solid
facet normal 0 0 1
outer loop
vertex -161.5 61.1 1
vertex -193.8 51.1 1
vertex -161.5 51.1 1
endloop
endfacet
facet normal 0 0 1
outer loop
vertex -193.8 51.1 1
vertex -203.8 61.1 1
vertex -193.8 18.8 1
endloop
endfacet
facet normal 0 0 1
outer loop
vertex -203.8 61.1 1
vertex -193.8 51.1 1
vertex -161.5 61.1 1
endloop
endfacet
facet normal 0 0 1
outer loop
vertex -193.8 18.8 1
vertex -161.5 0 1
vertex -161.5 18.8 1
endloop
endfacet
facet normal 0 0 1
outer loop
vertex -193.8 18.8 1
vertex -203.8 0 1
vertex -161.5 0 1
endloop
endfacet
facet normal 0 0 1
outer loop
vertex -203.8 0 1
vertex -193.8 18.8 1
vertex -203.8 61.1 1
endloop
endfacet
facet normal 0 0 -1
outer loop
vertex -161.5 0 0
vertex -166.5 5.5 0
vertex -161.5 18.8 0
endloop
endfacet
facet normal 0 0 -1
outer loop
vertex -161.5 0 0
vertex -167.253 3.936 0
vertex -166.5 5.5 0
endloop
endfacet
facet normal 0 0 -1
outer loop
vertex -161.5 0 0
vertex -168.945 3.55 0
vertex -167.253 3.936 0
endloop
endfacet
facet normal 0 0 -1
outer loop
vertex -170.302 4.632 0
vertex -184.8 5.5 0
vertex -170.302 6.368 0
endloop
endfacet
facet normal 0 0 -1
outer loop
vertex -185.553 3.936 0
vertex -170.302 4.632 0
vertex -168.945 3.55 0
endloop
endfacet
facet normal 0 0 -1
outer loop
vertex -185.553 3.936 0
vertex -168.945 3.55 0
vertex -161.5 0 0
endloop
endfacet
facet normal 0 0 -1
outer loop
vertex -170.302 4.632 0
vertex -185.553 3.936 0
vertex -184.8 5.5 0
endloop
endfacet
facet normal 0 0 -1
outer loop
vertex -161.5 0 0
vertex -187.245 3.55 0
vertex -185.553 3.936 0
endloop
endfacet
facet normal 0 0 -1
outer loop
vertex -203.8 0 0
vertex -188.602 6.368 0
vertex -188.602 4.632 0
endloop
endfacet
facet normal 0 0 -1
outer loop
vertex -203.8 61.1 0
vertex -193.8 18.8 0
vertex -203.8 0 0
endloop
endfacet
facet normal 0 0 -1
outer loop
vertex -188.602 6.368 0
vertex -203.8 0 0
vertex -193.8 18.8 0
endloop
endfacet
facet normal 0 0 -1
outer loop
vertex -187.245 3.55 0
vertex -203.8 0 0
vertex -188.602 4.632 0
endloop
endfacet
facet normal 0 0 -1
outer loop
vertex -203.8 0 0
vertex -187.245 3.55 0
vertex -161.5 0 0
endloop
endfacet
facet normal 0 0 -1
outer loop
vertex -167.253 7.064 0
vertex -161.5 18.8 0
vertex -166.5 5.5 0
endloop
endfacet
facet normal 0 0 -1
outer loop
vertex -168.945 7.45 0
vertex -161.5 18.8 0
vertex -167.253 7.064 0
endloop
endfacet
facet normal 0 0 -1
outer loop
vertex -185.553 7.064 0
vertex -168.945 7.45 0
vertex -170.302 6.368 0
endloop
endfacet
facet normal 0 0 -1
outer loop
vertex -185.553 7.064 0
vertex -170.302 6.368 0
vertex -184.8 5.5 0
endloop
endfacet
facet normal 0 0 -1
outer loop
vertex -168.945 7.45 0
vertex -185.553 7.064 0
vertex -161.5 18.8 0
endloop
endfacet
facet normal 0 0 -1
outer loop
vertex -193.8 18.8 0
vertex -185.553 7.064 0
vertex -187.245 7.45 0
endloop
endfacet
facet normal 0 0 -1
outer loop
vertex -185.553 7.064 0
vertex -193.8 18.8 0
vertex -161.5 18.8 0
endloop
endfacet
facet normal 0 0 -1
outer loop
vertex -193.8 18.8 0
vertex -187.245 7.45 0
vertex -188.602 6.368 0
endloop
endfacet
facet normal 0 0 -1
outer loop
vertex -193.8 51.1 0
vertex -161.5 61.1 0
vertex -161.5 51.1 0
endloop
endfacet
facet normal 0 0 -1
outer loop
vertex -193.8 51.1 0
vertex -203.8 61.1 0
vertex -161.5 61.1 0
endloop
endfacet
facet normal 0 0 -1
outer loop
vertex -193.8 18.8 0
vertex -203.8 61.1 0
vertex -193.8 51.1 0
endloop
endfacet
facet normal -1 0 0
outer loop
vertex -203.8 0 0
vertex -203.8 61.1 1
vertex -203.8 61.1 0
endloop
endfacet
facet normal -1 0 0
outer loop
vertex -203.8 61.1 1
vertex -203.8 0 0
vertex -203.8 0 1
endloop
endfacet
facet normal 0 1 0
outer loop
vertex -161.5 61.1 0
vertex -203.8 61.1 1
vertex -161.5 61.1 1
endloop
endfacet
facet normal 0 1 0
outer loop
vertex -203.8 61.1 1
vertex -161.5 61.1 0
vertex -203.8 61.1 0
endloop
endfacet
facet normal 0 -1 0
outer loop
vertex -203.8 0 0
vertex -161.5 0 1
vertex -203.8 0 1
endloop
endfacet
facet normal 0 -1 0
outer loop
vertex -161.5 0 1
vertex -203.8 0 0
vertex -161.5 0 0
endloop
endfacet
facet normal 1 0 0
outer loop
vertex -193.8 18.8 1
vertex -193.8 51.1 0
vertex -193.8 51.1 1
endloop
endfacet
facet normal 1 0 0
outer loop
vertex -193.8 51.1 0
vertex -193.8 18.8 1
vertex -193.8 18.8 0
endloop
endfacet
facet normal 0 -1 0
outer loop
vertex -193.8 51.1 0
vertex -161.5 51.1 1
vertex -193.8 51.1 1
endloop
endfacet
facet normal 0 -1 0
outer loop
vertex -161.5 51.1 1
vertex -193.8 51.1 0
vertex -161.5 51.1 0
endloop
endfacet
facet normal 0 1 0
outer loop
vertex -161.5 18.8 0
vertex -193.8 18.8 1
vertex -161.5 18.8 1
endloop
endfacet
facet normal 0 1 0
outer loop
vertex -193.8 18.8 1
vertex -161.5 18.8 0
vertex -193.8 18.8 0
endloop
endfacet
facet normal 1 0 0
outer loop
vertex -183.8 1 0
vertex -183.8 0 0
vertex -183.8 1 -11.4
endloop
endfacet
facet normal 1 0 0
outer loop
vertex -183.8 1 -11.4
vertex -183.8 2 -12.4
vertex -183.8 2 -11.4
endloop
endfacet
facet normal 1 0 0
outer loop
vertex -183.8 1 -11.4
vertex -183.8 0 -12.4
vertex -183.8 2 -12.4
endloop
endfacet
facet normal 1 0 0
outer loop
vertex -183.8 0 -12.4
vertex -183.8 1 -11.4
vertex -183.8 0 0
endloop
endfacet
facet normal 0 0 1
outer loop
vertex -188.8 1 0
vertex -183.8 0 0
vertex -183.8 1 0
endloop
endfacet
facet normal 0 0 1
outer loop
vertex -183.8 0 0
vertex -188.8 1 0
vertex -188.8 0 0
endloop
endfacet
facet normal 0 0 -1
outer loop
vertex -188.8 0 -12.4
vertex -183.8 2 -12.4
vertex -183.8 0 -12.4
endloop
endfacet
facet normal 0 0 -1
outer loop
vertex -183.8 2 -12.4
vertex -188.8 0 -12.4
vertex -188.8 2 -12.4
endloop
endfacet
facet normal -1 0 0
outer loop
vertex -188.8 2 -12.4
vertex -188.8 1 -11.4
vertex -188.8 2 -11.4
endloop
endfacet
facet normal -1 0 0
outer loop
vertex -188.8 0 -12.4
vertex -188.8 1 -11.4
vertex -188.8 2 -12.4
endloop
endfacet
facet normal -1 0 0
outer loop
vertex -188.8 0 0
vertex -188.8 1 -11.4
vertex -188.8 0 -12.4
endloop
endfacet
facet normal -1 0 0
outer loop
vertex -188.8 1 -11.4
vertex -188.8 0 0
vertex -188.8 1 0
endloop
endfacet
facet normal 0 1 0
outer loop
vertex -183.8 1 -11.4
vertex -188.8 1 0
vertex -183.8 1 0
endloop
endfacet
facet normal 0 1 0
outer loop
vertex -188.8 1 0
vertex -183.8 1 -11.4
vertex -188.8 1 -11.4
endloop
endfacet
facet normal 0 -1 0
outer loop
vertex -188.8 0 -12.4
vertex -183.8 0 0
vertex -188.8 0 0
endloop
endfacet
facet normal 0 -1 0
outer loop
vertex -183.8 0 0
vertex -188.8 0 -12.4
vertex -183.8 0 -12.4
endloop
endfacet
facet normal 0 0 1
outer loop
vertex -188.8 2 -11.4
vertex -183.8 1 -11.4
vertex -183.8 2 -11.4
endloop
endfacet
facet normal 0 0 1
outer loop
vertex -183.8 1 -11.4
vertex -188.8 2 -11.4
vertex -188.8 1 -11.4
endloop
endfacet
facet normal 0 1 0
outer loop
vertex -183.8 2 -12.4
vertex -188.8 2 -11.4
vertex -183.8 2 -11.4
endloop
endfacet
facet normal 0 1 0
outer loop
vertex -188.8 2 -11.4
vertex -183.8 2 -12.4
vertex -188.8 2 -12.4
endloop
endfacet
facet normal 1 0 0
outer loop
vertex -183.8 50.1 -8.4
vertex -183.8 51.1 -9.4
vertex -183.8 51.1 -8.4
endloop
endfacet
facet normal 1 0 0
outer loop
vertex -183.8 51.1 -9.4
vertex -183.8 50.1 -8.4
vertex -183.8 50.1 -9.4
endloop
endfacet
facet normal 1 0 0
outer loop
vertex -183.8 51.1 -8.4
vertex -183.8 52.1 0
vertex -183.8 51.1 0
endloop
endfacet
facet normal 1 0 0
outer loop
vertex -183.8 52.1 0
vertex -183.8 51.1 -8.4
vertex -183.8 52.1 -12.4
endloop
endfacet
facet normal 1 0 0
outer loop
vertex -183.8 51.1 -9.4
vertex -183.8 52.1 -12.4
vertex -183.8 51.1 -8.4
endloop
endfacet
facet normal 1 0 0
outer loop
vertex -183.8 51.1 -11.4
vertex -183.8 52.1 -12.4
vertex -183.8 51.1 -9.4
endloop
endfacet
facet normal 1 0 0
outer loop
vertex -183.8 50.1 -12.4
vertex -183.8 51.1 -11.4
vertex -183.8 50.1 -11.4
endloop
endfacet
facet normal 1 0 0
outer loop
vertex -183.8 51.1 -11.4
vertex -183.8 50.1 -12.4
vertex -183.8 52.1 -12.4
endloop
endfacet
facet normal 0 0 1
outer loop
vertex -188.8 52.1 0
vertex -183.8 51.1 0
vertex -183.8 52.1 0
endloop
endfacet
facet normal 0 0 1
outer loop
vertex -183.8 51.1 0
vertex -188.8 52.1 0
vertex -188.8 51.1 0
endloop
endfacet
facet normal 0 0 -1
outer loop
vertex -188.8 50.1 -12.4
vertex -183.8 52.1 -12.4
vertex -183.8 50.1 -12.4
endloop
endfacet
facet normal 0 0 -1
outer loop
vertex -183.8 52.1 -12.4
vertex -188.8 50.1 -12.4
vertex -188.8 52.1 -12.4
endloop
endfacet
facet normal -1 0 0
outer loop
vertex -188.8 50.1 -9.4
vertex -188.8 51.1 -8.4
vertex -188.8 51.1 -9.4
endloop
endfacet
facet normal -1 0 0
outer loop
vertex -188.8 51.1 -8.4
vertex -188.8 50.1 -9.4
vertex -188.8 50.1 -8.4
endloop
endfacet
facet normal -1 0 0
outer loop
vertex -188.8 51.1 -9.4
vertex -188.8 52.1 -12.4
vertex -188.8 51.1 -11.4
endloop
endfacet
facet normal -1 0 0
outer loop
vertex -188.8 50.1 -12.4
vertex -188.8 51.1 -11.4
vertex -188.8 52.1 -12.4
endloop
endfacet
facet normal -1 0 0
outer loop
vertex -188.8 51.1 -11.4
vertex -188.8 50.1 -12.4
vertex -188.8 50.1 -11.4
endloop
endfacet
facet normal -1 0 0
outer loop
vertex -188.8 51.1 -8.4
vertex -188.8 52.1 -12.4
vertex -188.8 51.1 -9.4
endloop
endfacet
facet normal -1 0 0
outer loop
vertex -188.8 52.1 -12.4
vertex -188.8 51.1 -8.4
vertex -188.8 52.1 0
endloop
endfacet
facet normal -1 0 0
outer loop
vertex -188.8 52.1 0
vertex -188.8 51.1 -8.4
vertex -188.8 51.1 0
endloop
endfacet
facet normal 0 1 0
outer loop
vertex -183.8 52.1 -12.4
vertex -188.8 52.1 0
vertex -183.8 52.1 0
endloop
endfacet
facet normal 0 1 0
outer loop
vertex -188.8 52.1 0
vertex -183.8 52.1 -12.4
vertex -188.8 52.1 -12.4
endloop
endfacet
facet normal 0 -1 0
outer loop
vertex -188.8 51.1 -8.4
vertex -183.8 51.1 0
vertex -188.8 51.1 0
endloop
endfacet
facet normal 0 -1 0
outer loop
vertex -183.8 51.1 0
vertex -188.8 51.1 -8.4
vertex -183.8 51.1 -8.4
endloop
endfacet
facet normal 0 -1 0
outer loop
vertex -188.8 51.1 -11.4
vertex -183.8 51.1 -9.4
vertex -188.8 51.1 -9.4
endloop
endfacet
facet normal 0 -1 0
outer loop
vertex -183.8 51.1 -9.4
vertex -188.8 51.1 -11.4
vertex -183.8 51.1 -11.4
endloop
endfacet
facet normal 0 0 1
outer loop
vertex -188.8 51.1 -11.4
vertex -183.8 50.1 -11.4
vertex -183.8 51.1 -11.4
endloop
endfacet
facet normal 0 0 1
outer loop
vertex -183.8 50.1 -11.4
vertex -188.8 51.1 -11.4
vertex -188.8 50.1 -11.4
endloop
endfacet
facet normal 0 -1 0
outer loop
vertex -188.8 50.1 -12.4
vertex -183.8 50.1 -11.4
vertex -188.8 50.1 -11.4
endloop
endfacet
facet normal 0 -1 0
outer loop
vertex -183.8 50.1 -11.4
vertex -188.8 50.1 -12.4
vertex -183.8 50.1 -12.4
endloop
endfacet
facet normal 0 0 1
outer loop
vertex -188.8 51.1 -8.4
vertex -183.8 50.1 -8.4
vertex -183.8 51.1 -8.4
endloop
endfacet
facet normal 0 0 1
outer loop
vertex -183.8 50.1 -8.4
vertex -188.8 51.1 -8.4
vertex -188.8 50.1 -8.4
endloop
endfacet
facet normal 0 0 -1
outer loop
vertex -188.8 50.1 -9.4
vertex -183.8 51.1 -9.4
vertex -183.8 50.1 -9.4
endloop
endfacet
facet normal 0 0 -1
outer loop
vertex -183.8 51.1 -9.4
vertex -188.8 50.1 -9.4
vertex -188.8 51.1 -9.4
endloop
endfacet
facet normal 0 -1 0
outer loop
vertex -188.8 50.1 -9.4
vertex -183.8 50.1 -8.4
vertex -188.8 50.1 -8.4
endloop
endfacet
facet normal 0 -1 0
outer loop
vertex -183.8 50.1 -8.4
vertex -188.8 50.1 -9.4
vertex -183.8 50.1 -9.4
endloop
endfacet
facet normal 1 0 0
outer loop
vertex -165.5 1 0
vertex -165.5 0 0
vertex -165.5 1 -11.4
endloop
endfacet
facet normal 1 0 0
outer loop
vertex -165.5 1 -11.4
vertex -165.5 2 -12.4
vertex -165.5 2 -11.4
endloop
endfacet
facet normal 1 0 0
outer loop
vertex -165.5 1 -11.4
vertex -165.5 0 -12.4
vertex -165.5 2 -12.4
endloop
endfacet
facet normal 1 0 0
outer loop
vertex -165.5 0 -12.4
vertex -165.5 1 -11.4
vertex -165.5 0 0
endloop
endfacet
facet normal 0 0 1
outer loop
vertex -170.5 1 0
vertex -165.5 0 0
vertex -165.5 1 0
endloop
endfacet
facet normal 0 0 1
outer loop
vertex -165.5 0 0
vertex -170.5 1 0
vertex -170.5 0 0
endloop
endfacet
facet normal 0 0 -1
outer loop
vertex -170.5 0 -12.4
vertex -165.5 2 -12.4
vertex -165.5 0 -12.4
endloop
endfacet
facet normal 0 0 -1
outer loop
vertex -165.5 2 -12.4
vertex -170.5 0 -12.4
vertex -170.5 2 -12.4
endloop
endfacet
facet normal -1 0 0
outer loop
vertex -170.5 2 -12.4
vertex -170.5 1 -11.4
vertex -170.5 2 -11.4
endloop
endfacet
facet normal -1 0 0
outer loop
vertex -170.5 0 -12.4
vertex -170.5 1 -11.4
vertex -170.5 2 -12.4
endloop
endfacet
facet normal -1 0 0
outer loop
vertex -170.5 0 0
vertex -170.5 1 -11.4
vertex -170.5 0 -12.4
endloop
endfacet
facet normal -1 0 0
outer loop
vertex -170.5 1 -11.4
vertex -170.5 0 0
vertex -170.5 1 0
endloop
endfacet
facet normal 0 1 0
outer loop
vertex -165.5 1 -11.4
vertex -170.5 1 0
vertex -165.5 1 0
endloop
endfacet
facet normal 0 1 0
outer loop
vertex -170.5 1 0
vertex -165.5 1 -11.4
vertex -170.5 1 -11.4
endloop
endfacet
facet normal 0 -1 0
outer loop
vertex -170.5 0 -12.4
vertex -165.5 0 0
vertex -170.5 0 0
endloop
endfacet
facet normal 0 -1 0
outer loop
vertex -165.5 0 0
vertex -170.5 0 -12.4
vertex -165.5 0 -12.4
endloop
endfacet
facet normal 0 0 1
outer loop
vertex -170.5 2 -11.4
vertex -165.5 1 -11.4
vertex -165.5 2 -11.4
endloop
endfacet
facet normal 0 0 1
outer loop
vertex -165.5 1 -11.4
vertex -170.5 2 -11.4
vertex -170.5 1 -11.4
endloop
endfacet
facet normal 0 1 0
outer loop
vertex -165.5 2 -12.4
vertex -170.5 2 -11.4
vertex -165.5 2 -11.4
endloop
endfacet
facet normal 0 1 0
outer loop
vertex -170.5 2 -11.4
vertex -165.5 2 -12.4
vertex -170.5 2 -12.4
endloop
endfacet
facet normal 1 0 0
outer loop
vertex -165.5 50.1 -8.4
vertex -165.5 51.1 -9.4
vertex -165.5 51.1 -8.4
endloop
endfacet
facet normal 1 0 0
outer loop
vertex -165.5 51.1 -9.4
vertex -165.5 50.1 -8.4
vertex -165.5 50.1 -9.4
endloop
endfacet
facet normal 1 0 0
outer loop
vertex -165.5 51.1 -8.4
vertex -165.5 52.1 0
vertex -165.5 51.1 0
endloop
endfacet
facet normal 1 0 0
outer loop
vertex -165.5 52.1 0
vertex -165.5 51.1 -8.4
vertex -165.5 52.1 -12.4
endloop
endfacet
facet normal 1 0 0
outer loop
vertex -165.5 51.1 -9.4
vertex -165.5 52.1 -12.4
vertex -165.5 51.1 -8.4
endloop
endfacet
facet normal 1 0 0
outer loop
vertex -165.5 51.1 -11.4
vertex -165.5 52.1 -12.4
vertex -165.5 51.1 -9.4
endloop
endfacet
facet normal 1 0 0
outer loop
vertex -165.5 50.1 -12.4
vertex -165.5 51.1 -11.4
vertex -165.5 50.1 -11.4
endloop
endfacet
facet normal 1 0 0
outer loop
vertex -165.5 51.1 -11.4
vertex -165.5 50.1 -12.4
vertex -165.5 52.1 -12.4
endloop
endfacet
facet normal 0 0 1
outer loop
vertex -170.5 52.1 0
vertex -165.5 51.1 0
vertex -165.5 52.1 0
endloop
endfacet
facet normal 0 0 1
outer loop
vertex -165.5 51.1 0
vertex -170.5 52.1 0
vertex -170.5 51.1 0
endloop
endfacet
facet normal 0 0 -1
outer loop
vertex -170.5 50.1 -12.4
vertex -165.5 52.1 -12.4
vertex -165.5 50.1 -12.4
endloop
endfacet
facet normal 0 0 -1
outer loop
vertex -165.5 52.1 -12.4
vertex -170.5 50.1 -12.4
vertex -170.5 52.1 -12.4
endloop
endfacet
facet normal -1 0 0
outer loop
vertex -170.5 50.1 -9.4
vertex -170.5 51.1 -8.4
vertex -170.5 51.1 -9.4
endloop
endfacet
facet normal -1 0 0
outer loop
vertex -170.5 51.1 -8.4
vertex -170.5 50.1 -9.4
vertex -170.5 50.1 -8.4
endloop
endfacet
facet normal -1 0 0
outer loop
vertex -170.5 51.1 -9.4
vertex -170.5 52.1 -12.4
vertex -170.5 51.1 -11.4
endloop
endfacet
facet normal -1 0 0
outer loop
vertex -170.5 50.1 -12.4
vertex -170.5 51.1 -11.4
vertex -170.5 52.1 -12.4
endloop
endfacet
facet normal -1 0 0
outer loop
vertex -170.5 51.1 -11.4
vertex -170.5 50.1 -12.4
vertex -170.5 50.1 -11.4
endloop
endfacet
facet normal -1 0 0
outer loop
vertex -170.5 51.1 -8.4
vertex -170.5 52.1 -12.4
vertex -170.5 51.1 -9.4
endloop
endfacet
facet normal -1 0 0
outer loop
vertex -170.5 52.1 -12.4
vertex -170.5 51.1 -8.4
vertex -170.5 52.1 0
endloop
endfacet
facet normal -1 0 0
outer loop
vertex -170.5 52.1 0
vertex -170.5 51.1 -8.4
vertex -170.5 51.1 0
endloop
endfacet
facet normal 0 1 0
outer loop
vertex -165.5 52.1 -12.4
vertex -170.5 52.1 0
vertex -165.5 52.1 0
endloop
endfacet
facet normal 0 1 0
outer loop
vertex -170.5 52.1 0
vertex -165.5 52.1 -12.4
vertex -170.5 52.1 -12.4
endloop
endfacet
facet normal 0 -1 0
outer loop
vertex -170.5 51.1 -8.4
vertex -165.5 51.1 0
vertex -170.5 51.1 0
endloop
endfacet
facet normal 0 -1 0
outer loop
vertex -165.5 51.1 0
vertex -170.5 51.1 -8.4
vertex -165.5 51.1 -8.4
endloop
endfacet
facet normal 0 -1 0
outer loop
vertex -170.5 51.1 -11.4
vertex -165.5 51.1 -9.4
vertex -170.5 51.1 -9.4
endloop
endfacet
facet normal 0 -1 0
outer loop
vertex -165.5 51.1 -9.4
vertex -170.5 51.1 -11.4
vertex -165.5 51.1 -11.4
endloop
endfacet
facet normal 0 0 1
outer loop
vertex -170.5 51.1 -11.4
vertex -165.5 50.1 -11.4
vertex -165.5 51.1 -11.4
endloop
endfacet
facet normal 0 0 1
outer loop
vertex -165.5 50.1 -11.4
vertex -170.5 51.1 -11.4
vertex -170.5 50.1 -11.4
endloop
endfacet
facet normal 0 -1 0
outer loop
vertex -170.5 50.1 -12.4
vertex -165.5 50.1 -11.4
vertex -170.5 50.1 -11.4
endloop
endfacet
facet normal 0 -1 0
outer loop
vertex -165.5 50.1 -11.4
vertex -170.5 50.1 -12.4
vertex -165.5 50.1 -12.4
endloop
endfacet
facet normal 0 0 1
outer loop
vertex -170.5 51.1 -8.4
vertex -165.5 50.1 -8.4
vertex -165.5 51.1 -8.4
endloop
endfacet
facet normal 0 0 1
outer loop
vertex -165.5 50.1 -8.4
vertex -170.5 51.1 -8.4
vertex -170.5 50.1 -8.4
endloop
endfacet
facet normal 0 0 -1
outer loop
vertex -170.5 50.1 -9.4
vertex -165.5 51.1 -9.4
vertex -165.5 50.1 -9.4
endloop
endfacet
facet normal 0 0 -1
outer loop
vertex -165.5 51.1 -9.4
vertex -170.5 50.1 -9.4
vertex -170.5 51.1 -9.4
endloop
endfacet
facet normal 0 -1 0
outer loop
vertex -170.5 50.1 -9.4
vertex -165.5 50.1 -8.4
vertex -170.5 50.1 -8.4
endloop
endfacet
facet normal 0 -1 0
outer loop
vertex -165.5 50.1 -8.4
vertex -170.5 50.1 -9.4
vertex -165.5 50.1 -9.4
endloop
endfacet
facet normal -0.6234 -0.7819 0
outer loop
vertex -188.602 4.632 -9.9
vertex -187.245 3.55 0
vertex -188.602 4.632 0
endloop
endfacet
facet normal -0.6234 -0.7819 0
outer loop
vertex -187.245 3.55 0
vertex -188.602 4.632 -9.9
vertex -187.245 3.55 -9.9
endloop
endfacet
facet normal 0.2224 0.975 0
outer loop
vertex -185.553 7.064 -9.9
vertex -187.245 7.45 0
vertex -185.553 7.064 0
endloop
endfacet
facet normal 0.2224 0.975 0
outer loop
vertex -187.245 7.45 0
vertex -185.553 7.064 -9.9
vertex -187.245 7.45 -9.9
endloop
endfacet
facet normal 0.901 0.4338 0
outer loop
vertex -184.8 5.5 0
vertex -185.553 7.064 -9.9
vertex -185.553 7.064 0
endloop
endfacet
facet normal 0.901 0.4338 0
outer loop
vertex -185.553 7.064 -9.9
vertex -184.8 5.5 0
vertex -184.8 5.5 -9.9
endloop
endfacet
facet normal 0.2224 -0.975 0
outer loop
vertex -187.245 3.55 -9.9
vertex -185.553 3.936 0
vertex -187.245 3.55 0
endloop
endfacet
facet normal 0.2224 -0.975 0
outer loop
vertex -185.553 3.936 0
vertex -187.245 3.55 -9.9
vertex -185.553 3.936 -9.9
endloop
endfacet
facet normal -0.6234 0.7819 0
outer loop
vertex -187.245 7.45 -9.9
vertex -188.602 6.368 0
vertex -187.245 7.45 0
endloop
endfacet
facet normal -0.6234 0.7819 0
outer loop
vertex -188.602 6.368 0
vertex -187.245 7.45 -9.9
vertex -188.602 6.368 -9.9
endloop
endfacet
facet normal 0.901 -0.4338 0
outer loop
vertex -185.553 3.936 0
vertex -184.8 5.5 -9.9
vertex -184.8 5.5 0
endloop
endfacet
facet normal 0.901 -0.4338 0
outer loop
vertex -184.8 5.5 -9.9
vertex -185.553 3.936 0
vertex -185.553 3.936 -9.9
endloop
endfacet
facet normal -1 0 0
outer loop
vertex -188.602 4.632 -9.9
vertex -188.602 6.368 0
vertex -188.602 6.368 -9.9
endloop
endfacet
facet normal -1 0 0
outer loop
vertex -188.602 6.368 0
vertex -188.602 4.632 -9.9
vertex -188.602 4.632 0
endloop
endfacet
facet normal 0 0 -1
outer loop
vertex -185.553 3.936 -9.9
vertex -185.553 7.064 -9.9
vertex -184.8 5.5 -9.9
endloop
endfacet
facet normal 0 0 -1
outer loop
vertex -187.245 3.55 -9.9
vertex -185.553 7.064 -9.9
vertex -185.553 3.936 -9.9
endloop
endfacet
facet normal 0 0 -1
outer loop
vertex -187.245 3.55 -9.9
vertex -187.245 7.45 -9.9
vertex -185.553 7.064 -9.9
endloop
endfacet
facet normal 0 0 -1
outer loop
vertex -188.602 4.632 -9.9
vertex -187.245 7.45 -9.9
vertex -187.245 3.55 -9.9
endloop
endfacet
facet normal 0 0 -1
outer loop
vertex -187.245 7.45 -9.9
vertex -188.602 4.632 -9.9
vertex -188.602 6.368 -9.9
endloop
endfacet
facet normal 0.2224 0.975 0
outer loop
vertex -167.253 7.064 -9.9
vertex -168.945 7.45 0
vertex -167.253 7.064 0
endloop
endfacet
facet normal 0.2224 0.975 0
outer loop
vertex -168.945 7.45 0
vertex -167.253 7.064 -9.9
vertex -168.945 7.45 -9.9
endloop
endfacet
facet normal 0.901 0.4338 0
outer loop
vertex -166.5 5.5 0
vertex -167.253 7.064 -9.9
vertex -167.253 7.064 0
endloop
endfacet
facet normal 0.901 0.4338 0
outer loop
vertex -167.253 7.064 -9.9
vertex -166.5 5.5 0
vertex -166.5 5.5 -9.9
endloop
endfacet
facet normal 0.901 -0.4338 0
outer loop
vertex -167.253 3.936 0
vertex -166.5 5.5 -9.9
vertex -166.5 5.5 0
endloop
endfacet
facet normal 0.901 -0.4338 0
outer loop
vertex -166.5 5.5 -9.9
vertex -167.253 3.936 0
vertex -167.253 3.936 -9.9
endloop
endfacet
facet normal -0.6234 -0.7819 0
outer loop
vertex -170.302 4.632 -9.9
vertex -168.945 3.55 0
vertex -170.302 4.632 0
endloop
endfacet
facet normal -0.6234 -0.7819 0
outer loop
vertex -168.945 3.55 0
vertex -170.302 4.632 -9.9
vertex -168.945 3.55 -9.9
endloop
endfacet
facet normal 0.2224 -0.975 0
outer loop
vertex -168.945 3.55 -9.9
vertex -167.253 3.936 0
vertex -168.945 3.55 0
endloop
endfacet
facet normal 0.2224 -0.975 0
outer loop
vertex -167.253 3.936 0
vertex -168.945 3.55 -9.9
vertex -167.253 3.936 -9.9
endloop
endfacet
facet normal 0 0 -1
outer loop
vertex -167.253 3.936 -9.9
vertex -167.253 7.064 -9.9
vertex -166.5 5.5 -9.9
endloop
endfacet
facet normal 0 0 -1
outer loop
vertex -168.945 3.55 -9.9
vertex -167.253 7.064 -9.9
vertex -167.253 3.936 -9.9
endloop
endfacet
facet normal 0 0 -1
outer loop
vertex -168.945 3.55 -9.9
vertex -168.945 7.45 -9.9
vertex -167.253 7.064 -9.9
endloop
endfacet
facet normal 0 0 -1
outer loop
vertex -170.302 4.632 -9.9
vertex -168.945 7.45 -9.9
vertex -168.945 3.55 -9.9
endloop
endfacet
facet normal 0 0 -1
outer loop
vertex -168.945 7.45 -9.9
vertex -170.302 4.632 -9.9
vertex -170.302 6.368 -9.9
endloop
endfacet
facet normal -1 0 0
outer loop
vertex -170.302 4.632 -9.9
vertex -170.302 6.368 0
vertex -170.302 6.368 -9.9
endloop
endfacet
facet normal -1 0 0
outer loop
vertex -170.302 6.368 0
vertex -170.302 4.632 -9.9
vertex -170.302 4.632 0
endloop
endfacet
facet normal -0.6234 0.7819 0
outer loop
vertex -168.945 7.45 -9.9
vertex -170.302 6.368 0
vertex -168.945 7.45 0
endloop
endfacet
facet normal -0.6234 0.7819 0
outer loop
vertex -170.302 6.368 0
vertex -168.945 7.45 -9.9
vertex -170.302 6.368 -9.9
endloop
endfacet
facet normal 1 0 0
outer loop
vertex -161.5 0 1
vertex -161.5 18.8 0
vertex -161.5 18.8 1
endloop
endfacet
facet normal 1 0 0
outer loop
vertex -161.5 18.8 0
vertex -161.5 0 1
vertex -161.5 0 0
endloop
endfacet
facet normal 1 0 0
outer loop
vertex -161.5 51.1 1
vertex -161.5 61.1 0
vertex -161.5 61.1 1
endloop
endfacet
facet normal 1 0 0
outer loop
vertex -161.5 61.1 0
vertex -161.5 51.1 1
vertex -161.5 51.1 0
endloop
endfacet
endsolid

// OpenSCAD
// SPDX-License-Identifier: AGPL-3.0-or-later
// SPDX-FileCopyrightText: Copyright 2022-2025 Zeus WPI

//#cube([31.82, 31.82, 7.13]);
base_width = 32.3;
base_height = 50.22;
hole_radius = 1.5;
d_edge_to_center_of_holes = 1.15 + hole_radius;
pin_height = 6;


total_height=15.26;
total_length=74;
display_start_length_from_top = 12;
width_of_ports=13;


// cover
screen_side = base_width;
height_base_and_screen = 15.6;
cover_thickness = 1;
chip_part_height = 17.8;
side_edge_width = 10; 
top_edge_width = 10;
bottom_edge_width = chip_part_height + 1;
clip_width = 5;
top_of_screen_to_top_of_chip_board = 10.9;
chip_board_thickness = 1.5;

lip = 1;
clip_length = top_of_screen_to_top_of_chip_board-cover_thickness+chip_board_thickness+lip;
module bottom_clip() {    
    translate([-6*screen_side,0,-clip_length]) {
        cube([clip_width,1,clip_length]);
        translate([0,1,0]) {cube([clip_width,1,1]);};
    };
}

module top_clip() {
    
    translate([-6*screen_side,screen_side+chip_part_height+1,-clip_length]) {
        cube([clip_width,1,clip_length]);
        translate([0,-1,0]) {cube([5,1,1]);};
        translate([0,-1,1+chip_board_thickness + 0.5]) {cube([5,1,1]);};
    };
}

module stick() {
    cylinder_height = top_of_screen_to_top_of_chip_board-cover_thickness;
    translate([-(6*screen_side) + 7,5.5,-cylinder_height]) {cylinder(cylinder_height, 2, 2);};
    translate([-(6*screen_side) + screen_side - 7,5.5,-cylinder_height]) {cylinder(cylinder_height, 2, 2);};
}

module cover() {
    difference() {
        translate([-(6*screen_side + side_edge_width),0,0]) {cube([6*screen_side + side_edge_width, screen_side + top_edge_width + bottom_edge_width, cover_thickness]);};
        translate([-(6*screen_side), bottom_edge_width, -1]) {cube([6*screen_side + 1, screen_side, 3]);};
    }
    linear_extrude(cover_thickness) {polygon([[0, 0], [0, -40], [-100, -40], [-130, 0]]);};
    
    for(i = [0 : 5]) {
        translate([i*screen_side,0,0]) {
            translate([5,0,0]) {
                bottom_clip();
                top_clip();
            }
            translate([screen_side-clip_width-4,0,0]) {
                bottom_clip();
                top_clip();
            }
            stick();
        }
    }
}
//cover();
difference() {
    cover();
    translate([-screen_side*5,-50,-20]) {cube([1000,1000,1000]);};
}
//mirror([1,0,0]) {
//    cover();
//}
